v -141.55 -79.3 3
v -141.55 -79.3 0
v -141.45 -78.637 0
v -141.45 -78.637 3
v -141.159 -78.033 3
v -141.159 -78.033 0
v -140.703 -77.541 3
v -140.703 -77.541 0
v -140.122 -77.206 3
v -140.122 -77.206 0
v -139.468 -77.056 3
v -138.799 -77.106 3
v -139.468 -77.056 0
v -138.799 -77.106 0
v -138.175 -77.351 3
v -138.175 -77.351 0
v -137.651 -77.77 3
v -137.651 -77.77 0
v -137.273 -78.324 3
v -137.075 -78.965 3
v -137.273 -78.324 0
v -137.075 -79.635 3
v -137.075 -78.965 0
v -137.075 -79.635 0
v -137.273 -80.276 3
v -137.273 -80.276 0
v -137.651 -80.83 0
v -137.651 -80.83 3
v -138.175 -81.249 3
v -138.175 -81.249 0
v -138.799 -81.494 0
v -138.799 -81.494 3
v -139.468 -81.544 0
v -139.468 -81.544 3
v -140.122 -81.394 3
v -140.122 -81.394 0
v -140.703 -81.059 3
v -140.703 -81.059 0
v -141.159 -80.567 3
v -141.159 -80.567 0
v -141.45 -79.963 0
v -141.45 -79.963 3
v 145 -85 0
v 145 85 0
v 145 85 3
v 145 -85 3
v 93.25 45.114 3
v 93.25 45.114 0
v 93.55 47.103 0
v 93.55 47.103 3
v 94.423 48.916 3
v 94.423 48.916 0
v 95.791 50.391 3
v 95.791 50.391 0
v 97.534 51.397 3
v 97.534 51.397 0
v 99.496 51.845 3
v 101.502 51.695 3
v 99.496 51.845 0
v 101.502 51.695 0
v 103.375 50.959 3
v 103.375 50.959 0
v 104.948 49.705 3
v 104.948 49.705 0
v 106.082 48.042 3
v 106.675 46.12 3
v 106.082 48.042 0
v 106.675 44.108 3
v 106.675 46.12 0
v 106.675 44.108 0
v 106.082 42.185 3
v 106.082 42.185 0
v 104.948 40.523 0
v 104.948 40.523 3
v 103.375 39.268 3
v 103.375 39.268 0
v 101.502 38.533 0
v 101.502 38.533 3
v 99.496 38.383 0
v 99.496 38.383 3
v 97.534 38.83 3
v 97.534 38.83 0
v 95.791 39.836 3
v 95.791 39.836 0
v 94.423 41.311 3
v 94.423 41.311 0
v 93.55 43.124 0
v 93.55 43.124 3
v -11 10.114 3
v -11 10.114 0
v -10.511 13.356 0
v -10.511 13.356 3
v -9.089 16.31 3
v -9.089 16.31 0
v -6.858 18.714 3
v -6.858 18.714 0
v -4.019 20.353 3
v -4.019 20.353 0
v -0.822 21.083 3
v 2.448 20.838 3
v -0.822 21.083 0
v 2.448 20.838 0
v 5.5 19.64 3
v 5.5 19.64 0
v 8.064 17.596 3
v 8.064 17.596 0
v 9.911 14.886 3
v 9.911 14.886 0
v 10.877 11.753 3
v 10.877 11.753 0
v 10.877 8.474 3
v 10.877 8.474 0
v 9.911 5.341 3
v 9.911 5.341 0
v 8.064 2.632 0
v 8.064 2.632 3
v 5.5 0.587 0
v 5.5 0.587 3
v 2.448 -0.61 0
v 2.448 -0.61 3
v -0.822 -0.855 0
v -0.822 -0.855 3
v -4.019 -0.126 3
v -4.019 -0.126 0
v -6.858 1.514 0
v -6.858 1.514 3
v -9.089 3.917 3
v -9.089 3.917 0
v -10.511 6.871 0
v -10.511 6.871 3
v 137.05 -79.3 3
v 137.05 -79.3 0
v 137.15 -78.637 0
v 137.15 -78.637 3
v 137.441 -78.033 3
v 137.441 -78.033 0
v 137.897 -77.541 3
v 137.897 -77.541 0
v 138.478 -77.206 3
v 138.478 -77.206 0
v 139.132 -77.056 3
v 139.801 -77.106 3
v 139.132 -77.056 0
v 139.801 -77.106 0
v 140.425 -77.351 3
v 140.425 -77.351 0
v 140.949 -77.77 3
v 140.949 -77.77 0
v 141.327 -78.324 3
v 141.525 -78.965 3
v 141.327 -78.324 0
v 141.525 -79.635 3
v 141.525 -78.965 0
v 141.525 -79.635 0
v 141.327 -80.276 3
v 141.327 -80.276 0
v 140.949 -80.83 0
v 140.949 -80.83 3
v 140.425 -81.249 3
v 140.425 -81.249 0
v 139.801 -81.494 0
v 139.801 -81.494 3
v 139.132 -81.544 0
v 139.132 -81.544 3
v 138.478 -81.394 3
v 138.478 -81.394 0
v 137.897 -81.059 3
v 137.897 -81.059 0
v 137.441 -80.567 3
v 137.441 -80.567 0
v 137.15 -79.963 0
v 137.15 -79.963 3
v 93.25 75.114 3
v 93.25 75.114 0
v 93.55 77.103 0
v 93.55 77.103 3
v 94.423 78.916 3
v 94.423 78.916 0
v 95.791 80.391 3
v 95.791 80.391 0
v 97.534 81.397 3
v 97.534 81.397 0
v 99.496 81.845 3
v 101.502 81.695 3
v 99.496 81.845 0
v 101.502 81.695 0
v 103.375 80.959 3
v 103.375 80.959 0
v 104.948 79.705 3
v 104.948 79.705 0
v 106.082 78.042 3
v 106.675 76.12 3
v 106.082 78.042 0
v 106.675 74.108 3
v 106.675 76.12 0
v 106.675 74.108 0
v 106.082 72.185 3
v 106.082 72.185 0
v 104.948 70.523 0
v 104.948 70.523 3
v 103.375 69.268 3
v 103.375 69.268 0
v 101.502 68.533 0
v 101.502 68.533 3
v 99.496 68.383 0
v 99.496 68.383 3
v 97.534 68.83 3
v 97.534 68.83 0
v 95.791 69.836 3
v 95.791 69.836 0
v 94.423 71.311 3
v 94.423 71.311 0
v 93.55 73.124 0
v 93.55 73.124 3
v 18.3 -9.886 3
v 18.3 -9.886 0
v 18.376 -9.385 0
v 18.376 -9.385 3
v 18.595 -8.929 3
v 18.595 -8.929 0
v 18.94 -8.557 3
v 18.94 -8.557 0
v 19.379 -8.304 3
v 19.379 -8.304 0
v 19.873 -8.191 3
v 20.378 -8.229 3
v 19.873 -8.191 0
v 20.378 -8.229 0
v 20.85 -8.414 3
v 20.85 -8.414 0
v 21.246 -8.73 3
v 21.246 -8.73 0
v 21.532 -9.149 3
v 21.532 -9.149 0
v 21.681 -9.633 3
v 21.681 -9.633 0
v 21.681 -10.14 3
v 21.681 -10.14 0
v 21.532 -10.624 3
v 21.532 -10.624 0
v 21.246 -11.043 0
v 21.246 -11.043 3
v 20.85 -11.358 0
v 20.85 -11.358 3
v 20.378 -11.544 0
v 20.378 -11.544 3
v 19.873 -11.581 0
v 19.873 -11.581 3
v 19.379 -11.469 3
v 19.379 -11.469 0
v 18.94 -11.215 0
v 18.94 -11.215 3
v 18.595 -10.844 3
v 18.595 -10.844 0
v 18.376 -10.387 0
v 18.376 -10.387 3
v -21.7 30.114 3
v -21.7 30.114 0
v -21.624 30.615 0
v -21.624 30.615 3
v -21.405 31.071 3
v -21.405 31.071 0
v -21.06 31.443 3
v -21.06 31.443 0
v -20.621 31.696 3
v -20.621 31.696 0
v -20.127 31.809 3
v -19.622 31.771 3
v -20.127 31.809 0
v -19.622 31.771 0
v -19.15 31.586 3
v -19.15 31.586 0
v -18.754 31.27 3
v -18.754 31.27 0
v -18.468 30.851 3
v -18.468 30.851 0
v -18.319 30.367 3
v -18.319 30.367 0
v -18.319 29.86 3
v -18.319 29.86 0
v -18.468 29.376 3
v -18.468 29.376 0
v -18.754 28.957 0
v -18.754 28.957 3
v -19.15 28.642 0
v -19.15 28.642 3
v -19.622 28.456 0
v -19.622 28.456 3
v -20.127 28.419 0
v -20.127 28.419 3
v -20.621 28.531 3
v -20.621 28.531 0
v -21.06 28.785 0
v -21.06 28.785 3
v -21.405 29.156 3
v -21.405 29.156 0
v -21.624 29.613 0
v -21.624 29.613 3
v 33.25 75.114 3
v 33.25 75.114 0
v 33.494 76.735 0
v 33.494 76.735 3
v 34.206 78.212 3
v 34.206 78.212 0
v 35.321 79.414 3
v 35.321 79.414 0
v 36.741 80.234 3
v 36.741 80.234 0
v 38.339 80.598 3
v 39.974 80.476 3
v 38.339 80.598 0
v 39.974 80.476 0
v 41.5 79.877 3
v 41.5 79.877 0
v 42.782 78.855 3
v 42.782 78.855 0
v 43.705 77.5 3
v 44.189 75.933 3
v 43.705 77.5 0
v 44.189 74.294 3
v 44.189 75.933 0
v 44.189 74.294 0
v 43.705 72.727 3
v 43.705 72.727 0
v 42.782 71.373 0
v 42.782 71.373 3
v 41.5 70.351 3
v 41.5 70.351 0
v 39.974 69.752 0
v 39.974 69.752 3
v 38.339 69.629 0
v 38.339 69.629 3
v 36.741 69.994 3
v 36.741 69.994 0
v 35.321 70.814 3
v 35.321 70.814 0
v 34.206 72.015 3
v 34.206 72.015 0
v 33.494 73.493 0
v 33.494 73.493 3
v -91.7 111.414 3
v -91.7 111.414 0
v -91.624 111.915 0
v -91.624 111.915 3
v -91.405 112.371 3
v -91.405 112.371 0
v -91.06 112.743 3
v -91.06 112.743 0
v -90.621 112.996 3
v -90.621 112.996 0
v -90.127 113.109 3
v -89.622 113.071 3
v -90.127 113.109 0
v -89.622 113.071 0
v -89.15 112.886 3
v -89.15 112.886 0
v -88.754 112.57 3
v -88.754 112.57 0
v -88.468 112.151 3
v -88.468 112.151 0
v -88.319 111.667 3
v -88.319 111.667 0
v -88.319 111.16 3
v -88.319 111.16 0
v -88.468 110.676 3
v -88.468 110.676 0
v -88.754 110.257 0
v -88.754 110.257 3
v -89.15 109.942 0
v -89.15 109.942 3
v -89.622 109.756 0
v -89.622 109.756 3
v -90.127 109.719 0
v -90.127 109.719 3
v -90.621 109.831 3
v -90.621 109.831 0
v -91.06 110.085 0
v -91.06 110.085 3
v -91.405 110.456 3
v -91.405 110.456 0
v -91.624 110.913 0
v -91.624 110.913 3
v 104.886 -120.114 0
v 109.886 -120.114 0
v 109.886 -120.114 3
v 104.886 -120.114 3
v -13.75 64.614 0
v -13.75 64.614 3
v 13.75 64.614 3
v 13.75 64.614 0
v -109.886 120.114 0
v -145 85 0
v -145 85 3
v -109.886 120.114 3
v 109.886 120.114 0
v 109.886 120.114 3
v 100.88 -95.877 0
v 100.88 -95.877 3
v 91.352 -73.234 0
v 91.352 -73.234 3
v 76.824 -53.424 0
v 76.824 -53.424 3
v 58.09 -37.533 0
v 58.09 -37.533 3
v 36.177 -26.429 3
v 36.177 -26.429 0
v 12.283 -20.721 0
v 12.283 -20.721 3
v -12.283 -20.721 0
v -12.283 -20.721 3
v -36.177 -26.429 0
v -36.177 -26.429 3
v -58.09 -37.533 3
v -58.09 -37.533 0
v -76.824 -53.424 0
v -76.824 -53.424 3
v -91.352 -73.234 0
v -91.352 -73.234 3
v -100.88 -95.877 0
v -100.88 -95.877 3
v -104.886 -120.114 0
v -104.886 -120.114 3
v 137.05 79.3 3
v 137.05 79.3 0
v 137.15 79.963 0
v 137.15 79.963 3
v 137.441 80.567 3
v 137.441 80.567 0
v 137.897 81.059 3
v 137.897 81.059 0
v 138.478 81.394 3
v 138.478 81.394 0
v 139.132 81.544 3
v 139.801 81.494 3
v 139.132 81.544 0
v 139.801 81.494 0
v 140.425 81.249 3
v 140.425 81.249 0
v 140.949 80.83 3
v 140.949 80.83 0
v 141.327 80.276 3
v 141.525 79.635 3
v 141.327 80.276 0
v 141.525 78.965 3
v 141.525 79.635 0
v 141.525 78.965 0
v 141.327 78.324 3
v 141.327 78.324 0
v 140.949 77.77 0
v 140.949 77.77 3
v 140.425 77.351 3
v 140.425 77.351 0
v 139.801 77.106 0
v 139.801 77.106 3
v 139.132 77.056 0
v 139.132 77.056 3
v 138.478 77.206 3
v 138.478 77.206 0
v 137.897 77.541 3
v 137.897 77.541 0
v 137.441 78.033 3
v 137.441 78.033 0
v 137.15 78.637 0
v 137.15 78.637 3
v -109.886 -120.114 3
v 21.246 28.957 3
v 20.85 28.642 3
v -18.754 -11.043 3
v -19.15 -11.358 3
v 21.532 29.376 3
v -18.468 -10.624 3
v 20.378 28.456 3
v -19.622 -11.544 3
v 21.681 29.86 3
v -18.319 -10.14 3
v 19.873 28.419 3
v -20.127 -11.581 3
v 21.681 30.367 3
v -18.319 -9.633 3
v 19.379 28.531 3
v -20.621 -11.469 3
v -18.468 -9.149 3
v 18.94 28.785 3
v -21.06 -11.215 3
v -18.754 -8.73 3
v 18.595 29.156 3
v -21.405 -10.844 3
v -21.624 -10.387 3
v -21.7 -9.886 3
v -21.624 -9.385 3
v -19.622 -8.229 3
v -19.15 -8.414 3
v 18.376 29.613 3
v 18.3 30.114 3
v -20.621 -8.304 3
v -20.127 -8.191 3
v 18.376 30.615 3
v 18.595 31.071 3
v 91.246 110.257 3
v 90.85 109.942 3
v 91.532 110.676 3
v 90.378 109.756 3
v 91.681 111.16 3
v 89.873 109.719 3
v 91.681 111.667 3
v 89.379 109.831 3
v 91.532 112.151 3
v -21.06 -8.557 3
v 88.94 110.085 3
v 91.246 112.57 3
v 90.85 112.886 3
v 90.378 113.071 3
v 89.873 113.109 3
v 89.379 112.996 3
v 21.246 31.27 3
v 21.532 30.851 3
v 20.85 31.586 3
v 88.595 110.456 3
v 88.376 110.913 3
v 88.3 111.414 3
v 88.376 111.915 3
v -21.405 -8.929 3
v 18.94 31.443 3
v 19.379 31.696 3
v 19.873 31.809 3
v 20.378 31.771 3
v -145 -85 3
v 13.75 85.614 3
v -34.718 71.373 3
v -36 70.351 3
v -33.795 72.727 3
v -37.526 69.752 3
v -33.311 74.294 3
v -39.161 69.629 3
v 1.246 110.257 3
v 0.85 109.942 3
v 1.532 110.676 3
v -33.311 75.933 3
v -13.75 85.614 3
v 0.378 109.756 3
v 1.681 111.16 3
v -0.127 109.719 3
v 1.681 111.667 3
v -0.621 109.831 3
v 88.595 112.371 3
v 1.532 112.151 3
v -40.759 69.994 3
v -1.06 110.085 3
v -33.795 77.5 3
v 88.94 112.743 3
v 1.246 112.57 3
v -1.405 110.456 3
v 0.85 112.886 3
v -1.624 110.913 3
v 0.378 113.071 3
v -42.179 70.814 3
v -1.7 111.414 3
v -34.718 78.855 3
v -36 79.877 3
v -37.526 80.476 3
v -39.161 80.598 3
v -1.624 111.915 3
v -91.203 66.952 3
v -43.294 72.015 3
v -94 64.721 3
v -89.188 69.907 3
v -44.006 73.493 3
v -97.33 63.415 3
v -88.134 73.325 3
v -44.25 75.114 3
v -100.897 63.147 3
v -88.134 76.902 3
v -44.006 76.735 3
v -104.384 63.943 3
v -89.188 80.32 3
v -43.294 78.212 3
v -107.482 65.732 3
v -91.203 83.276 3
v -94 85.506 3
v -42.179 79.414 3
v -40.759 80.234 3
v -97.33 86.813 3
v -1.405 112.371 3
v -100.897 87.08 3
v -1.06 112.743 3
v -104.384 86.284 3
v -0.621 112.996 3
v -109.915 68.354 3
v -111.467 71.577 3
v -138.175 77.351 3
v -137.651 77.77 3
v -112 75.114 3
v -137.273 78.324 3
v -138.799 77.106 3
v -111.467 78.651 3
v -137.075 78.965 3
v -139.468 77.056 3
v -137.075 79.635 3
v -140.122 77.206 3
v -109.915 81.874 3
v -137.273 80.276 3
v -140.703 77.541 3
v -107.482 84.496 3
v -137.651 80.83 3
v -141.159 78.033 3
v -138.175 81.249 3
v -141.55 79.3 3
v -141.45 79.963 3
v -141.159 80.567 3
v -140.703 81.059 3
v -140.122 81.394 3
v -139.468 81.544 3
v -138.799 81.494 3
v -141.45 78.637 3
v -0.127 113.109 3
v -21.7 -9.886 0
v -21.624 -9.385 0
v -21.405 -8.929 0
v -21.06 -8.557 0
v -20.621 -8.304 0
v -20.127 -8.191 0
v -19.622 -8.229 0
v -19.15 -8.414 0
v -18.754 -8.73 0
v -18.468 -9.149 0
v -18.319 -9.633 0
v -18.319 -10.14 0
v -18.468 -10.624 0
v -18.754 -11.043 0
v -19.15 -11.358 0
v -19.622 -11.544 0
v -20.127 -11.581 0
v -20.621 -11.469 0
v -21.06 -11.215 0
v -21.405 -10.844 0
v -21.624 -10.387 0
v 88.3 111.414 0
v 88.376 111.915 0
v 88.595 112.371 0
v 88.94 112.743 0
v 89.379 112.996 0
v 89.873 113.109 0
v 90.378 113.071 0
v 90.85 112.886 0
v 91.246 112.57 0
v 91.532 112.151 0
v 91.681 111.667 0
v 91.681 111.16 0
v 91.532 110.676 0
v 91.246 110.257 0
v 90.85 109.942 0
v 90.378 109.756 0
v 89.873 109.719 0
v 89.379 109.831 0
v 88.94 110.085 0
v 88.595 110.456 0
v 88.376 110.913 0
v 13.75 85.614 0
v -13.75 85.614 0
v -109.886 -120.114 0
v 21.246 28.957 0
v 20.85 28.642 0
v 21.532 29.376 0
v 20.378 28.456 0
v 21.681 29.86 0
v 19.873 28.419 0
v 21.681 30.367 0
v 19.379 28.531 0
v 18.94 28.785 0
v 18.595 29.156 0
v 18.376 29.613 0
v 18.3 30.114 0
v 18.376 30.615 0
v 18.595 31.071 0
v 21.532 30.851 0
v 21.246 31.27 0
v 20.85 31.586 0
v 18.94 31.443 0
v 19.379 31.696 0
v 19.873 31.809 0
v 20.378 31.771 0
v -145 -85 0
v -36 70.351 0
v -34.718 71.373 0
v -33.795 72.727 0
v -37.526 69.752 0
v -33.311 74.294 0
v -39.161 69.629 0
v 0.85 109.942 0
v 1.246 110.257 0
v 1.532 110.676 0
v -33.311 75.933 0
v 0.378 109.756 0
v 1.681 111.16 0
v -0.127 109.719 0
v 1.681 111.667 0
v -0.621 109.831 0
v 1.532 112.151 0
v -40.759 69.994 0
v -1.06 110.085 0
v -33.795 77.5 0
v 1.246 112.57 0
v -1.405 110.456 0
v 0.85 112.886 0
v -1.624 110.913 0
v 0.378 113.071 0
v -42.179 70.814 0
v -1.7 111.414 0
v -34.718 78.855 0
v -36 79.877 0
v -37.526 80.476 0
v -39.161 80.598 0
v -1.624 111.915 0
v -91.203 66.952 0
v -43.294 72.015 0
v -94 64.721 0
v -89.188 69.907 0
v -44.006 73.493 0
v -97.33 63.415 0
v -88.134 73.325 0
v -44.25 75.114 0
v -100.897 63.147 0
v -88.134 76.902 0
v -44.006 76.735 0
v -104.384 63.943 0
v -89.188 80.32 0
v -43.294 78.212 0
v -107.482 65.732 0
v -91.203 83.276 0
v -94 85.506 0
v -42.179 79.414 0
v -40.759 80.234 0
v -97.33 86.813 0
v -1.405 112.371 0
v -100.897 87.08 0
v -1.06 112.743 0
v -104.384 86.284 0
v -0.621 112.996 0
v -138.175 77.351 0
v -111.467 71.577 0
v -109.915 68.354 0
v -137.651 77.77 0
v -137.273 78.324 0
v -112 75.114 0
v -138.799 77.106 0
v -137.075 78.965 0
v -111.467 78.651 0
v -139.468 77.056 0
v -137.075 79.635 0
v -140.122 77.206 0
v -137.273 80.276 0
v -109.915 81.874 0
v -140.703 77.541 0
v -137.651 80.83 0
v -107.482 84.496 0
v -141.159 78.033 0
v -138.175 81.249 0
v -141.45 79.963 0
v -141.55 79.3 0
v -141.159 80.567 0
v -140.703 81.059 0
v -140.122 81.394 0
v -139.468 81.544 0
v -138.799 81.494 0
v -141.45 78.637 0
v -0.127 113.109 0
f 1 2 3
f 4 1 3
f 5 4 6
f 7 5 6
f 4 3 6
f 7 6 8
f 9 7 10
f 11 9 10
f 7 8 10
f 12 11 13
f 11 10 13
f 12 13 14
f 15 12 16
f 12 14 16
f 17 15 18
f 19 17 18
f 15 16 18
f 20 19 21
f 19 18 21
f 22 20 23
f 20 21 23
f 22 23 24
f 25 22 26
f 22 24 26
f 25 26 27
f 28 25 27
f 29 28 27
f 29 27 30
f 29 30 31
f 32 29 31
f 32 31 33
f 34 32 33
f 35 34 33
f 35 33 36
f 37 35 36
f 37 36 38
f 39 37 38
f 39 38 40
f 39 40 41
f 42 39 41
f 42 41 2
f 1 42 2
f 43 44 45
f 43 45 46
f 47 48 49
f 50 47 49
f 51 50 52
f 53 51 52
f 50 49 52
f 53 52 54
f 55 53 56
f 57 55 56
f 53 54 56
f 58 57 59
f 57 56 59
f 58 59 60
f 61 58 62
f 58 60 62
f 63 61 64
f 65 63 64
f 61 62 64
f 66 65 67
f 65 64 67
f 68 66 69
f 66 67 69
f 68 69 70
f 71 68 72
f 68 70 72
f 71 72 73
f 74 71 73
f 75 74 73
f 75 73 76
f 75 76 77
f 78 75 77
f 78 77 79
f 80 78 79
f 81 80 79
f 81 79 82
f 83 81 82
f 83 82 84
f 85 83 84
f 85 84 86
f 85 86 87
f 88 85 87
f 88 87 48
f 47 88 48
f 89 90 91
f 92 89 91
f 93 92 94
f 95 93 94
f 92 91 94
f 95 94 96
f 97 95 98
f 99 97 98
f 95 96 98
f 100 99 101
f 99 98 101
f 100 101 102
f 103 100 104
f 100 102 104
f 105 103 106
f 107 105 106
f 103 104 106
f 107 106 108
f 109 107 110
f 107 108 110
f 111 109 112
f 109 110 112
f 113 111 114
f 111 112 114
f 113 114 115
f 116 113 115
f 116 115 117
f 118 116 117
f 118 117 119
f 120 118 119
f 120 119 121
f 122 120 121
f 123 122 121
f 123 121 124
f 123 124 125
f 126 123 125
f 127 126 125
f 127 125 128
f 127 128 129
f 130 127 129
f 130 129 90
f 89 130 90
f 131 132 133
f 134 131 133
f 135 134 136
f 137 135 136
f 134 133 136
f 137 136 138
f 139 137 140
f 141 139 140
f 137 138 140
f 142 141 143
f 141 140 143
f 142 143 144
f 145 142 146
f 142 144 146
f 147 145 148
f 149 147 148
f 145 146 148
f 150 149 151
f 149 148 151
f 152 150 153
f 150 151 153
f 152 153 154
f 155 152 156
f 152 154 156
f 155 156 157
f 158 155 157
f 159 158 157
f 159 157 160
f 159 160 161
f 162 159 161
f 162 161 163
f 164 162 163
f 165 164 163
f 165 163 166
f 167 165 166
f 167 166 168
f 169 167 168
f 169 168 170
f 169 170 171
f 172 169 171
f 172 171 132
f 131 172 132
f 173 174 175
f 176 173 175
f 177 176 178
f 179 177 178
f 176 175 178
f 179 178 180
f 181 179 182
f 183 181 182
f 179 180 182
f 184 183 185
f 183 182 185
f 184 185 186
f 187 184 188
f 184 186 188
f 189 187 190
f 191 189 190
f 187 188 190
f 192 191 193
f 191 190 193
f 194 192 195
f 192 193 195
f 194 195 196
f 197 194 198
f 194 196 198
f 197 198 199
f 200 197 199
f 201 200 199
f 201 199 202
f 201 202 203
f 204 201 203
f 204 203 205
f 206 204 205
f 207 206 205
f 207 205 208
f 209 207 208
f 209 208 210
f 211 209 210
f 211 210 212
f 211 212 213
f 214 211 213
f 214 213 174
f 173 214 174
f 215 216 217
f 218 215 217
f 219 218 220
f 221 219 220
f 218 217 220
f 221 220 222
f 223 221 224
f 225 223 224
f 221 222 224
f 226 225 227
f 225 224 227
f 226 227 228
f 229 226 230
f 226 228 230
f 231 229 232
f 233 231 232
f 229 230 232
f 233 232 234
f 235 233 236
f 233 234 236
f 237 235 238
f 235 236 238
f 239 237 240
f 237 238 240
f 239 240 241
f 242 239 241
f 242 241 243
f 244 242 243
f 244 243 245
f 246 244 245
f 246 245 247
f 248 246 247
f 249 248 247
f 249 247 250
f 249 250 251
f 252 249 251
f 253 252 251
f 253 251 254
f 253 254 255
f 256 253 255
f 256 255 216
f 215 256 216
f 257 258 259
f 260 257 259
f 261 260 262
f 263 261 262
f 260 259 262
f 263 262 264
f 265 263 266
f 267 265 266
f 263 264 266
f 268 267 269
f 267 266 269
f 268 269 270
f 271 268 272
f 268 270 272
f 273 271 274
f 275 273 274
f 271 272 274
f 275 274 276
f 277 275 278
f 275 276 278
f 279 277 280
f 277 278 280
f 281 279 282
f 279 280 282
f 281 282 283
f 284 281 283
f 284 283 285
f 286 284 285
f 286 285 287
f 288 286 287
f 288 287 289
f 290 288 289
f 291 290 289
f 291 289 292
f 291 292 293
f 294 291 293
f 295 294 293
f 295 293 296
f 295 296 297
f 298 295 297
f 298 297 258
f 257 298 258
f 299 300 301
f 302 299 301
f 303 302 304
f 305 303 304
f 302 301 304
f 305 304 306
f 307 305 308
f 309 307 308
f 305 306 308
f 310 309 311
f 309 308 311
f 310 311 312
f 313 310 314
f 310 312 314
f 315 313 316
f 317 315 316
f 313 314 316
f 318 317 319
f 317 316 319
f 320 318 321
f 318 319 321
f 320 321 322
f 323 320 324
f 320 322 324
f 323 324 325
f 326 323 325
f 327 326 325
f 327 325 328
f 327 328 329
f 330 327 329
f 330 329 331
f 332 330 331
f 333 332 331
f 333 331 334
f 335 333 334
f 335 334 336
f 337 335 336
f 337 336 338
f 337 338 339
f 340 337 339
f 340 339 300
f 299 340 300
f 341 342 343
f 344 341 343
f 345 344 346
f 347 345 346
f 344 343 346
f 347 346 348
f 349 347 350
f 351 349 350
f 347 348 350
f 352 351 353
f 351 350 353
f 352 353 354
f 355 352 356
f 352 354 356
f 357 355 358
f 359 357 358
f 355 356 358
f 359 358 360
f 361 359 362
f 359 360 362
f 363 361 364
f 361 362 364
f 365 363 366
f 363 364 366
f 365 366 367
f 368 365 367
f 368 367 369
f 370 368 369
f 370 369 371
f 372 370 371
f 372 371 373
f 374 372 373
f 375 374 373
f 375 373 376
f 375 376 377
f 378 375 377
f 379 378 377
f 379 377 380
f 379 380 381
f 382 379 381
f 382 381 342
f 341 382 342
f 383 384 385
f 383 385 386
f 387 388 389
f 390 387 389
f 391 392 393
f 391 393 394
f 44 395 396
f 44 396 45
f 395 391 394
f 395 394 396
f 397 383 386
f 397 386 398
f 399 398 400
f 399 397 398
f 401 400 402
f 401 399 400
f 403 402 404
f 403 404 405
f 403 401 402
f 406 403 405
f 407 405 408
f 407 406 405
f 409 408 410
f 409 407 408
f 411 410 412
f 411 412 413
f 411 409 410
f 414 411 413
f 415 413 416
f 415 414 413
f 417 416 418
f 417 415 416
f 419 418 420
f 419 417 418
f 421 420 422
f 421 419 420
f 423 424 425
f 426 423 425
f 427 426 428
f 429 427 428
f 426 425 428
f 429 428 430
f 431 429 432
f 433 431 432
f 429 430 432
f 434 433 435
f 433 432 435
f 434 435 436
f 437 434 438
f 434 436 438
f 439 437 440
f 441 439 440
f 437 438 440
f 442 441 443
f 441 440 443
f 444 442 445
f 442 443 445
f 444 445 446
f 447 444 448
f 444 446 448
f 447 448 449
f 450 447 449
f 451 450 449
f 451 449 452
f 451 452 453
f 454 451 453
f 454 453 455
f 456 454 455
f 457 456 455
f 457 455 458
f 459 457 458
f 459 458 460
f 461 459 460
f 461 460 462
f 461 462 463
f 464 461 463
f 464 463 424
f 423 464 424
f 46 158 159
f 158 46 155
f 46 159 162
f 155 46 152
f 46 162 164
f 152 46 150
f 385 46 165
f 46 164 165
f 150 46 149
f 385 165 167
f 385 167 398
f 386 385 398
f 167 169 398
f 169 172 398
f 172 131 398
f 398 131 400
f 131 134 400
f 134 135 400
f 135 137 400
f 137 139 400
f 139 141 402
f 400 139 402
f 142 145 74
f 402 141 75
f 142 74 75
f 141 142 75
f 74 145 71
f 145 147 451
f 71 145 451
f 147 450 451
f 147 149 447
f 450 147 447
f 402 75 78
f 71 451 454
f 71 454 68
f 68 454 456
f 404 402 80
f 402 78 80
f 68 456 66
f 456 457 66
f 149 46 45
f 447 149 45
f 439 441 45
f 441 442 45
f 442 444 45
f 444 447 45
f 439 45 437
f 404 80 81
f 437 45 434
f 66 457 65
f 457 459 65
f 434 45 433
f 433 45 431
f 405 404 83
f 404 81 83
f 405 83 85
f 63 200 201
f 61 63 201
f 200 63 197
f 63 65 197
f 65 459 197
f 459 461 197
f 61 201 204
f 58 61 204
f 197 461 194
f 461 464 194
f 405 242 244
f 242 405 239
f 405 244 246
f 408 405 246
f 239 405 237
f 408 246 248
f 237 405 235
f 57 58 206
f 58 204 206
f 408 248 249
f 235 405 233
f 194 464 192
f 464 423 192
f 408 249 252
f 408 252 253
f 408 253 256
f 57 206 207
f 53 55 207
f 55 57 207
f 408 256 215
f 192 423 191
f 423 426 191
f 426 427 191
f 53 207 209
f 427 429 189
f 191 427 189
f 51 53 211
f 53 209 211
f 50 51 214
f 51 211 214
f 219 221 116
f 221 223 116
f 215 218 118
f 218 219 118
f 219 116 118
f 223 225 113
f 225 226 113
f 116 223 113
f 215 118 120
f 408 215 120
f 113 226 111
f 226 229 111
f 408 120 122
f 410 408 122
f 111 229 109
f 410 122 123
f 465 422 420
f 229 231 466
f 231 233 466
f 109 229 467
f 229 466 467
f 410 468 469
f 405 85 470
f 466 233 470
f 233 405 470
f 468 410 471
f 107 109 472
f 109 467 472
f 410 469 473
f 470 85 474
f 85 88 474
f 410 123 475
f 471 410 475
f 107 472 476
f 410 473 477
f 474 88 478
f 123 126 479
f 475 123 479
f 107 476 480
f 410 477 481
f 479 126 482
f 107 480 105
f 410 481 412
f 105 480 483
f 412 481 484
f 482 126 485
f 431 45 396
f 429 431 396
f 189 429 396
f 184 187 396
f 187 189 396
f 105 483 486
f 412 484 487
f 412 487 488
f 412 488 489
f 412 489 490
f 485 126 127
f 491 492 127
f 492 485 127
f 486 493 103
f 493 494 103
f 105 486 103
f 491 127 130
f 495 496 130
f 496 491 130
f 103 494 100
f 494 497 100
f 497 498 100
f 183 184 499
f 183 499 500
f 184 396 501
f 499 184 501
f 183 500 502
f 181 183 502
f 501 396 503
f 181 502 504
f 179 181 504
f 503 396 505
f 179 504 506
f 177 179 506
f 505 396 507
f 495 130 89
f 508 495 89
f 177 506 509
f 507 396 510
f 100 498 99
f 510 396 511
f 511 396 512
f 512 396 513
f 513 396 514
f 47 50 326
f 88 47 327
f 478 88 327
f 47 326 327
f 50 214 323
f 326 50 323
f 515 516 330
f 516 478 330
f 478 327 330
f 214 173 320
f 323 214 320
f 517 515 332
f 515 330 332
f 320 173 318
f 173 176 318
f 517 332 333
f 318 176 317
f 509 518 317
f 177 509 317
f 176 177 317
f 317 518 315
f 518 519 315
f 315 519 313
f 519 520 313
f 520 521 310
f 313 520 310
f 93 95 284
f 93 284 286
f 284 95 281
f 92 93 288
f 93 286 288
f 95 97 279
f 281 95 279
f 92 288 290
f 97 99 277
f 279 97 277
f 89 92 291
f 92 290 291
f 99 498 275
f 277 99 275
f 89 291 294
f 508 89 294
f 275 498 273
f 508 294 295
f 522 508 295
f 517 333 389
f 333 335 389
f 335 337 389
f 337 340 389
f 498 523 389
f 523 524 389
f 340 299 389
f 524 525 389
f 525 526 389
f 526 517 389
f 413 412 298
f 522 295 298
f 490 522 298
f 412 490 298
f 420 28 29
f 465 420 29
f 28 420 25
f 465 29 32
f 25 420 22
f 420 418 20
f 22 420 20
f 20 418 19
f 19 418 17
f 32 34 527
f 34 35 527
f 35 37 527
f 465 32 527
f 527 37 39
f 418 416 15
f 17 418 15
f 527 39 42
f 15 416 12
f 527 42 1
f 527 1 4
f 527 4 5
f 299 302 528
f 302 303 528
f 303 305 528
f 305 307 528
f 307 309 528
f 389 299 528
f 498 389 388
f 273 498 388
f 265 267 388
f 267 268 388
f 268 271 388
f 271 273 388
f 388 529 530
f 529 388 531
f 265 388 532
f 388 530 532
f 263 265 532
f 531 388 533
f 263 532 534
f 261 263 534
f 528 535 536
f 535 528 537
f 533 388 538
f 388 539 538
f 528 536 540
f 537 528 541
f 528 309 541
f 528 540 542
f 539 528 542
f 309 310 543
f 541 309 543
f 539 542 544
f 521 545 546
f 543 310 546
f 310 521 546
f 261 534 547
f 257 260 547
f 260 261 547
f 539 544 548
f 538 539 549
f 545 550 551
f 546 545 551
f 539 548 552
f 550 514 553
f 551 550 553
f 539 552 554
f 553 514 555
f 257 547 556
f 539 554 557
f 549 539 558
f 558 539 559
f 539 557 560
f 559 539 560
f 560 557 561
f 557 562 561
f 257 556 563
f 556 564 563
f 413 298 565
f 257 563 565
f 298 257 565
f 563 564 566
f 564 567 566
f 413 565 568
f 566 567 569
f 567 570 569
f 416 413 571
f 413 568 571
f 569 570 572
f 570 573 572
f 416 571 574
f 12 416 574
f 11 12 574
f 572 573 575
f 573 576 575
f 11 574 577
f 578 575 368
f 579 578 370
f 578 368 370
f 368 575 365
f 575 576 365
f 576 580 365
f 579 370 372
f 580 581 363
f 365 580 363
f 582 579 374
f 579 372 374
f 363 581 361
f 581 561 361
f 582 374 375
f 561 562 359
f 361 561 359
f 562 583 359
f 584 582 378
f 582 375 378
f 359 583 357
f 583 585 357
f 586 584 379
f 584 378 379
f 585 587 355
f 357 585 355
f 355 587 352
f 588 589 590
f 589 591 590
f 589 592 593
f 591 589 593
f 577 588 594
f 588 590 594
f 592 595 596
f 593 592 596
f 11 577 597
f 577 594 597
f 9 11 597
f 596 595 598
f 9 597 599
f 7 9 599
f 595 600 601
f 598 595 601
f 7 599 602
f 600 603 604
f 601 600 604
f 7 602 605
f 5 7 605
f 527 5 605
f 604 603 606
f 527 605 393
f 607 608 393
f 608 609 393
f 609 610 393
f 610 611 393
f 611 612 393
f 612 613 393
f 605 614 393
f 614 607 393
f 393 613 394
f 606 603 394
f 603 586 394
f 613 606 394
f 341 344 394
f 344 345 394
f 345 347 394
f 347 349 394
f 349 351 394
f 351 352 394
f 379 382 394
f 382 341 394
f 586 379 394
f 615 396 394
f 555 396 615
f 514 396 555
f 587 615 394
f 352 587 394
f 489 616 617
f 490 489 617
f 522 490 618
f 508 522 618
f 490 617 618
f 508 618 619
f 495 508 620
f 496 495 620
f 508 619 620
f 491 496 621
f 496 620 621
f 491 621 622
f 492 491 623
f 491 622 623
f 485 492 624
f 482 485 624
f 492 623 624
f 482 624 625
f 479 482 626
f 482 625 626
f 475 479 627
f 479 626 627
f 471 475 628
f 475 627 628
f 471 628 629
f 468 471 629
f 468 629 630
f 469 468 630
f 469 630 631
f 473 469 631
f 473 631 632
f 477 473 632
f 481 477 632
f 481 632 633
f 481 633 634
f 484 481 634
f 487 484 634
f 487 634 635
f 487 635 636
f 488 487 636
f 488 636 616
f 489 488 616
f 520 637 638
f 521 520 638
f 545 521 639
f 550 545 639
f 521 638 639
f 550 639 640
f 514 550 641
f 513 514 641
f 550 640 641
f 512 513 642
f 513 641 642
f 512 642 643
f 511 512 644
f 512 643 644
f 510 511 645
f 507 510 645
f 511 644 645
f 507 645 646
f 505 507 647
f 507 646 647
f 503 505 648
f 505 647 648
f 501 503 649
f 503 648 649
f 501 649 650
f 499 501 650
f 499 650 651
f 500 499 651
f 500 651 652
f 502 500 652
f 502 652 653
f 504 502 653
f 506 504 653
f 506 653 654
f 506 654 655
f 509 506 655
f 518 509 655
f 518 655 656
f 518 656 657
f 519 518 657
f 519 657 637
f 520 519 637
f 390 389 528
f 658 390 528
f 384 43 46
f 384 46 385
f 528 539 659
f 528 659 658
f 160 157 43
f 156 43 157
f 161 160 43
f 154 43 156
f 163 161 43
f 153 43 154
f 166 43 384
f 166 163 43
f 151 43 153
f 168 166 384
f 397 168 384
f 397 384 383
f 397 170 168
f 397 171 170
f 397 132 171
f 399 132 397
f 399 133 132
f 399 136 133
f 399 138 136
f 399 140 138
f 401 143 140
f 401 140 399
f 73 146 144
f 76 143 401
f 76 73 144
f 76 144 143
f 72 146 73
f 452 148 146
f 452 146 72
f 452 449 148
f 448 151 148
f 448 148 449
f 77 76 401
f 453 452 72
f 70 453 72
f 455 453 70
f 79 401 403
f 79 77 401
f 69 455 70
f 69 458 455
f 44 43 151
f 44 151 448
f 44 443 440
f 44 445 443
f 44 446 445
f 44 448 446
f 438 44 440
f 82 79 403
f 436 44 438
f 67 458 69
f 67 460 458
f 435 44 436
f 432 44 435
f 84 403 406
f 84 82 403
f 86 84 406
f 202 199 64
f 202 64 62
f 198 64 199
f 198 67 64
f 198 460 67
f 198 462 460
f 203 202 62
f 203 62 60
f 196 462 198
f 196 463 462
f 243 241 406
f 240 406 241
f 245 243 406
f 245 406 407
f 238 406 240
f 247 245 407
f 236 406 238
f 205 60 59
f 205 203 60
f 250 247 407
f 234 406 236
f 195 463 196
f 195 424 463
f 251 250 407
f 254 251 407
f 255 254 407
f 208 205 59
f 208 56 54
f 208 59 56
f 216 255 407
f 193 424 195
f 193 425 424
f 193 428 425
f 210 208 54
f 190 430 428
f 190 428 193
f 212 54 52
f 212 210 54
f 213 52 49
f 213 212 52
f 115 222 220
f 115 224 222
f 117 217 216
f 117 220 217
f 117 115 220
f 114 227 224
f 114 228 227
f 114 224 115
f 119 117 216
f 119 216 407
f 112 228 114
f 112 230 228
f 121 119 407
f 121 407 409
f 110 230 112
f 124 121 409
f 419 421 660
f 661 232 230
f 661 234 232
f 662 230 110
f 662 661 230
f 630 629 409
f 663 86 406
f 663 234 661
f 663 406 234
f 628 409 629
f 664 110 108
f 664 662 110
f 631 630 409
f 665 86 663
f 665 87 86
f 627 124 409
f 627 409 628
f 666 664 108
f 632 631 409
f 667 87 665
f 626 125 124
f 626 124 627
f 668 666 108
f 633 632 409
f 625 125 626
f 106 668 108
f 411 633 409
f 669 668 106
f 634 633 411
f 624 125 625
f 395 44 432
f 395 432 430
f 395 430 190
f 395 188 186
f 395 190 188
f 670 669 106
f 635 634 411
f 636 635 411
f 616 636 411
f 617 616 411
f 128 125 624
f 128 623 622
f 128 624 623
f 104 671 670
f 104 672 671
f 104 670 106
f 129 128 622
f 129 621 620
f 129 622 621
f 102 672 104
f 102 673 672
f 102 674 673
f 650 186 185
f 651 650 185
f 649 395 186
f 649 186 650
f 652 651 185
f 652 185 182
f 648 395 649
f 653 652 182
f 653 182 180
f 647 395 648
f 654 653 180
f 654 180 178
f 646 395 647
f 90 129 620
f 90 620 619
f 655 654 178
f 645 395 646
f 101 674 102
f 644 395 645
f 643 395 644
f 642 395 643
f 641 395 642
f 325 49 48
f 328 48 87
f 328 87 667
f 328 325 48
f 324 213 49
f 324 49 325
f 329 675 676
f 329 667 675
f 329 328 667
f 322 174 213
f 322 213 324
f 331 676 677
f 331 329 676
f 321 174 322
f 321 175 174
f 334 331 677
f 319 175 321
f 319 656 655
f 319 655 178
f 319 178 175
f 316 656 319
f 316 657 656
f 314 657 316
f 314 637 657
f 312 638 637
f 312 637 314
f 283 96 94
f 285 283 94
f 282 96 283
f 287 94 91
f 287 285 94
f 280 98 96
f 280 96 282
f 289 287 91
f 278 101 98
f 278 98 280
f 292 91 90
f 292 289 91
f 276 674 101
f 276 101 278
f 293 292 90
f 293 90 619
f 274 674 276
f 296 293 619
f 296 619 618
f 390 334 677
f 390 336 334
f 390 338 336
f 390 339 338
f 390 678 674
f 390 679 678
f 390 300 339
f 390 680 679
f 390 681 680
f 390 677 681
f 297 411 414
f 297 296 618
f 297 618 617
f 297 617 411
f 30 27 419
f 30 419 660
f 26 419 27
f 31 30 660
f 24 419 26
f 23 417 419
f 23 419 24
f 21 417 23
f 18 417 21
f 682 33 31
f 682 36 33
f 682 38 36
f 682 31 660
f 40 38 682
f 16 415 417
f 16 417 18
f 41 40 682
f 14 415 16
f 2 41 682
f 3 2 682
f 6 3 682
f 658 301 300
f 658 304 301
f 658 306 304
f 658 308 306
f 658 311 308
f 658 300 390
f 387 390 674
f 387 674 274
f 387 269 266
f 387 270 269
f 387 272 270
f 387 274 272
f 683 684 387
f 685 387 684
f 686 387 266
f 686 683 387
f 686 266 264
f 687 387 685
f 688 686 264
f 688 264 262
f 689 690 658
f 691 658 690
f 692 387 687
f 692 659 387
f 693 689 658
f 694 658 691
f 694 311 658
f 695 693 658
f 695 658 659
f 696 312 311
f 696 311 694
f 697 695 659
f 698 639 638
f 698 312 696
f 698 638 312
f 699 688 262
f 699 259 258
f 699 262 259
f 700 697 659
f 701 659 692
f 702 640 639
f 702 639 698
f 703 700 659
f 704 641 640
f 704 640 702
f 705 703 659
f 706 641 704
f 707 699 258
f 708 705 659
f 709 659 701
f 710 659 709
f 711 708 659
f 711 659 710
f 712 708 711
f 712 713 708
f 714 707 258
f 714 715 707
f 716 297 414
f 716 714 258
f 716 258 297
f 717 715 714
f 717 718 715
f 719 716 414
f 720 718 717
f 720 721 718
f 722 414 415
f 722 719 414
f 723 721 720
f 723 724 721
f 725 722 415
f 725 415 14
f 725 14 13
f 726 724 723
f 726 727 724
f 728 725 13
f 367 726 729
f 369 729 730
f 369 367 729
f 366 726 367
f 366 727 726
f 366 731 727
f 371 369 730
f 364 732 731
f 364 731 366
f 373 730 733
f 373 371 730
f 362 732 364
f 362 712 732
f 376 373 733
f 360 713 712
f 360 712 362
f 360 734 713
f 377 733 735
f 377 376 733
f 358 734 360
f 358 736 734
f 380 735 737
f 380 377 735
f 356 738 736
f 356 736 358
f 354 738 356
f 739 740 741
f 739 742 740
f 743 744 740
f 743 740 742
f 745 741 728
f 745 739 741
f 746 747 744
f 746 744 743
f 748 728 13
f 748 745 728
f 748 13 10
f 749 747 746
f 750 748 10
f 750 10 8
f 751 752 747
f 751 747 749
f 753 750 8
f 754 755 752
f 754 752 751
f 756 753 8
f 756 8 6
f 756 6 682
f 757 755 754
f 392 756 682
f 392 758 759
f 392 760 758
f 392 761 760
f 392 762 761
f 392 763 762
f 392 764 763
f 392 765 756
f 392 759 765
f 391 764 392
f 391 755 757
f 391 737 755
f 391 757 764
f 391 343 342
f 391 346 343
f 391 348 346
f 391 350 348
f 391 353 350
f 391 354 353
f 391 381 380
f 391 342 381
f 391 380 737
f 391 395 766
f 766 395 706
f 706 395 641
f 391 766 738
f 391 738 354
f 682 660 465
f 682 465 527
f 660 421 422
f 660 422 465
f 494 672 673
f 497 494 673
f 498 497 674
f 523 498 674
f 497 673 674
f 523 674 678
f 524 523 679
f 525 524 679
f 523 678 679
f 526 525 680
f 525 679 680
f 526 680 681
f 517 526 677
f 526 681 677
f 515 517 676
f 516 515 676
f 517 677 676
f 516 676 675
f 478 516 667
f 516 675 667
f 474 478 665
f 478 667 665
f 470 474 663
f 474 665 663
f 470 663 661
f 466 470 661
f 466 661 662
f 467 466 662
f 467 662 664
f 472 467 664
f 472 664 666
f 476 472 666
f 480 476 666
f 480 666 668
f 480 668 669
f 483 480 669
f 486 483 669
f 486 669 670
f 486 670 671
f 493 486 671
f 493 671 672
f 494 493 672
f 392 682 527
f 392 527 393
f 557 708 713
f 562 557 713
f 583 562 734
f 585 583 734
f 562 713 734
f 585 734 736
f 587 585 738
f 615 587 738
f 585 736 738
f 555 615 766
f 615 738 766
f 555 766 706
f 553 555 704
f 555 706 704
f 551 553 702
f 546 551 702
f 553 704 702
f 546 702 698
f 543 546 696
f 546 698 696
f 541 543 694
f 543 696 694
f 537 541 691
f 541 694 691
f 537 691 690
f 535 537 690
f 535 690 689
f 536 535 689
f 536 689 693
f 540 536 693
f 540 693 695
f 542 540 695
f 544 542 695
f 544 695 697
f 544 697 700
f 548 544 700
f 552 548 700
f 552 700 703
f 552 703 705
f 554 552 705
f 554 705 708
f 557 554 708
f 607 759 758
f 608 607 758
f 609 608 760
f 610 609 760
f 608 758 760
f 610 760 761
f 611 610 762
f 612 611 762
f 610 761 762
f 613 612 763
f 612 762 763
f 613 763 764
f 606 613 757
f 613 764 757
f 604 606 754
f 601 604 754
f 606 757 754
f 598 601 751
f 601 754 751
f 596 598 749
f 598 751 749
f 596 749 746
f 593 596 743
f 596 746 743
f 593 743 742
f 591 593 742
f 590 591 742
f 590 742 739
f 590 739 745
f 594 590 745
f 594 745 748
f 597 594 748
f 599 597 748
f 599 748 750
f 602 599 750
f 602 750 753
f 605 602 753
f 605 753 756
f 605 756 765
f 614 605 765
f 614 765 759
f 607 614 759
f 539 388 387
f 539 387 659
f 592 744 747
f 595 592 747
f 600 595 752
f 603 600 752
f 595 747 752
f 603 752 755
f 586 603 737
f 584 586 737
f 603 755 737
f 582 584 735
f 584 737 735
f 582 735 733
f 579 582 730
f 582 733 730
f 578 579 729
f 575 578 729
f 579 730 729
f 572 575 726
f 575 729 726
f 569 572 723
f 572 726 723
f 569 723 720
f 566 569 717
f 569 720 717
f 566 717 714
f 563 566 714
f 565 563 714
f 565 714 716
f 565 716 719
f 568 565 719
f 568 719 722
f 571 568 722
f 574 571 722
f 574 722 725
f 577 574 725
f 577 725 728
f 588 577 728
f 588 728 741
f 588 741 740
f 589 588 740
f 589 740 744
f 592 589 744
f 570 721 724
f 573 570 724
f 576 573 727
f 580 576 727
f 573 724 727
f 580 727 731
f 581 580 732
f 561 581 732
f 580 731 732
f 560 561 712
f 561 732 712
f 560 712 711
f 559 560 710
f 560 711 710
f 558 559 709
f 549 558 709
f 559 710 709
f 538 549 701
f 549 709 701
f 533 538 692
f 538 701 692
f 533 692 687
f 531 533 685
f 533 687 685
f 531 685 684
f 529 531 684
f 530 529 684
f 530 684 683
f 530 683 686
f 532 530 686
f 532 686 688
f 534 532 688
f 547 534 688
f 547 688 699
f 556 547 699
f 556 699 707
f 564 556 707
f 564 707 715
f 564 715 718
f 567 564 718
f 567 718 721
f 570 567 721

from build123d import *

# Parameters (mm, degrees)
BOSS_EXTRU_1_DEPTH      = 3
D_GAGEMENT_M42_D        = 4.5
D_GAGEMENT_M42_DEPTH    = 10
D_GAGEMENT_M42_TIP      = 1.351936393
D_GAGEMENT_M221_D       = 24
D_GAGEMENT_M221_DEPTH   = 10
D_GAGEMENT_M221_TIP     = 7.210327428
D_GAGEMENT_M121_D       = 13.5
D_GAGEMENT_M121_DEPTH   = 10
D_GAGEMENT_M121_TIP     = 4.055809178
D_GAGEMENT_M101_D       = 11
D_GAGEMENT_M101_DEPTH   = 10
D_GAGEMENT_M101_TIP     = 3.304733405
ESQUISSE26_W            = 27.5
ESQUISSE26_H            = 21
ENL_V_MAT_EXTRU_1_DEPTH = 10
D_GAGEMENT_M31_D        = 3.4
D_GAGEMENT_M201_D       = 22
D_GAGEMENT_M33_D        = 3.4


with BuildPart() as part:
    # Esquisse1 → Boss.-Extru.1 (new body)
    with BuildSketch(Plane.XY):
        with BuildLine():
            Line((-145, 85), (-109.886246, 120.113754))
            Line((-109.886246, 120.113754), (109.886246, 120.113754))
            Line((109.886246, 120.113754), (145, 85))
            Line((145, 85), (145, -85))
            Line((145, -85), (109.886246, -120.113754))
            Line((109.886246, -120.113754), (104.886246, -120.113754))
            ThreePointArc((104.886246, -120.113754), (0, -20), (-104.886246, -120.113754))
            Line((-104.886246, -120.113754), (-109.886246, -120.113754))
            Line((-109.886246, -120.113754), (-145, -85))
            Line((-145, -85), (-145, 85))
        make_face()
    extrude(amount=BOSS_EXTRU_1_DEPTH)

    # Dégagement M42
    with Locations(Plane.XY.offset(3)):
        with Locations((-139.3, 79.3), (-139.3, -79.3), (139.3, -79.3), (139.3, 79.3)):
            Hole(D_GAGEMENT_M42_D / 2, depth=D_GAGEMENT_M42_DEPTH)
            with Locations((0, 0, -(D_GAGEMENT_M42_DEPTH + D_GAGEMENT_M42_TIP / 2))):  # 118° drill point
                Cone(0, D_GAGEMENT_M42_D / 2, D_GAGEMENT_M42_TIP, mode=Mode.SUBTRACT)

    # Dégagement M221
    with Locations(Plane.XY.offset(3)):
        with Locations((-100, 75.113754)):
            Hole(D_GAGEMENT_M221_D / 2, depth=D_GAGEMENT_M221_DEPTH)
            with Locations((0, 0, -(D_GAGEMENT_M221_DEPTH + D_GAGEMENT_M221_TIP / 2))):  # 118° drill point
                Cone(0, D_GAGEMENT_M221_D / 2, D_GAGEMENT_M221_TIP, mode=Mode.SUBTRACT)

    # Dégagement M121
    with Locations(Plane.XY.offset(3)):
        with Locations((100, 75.113754), (100, 45.113754)):
            Hole(D_GAGEMENT_M121_D / 2, depth=D_GAGEMENT_M121_DEPTH)
            with Locations((0, 0, -(D_GAGEMENT_M121_DEPTH + D_GAGEMENT_M121_TIP / 2))):  # 118° drill point
                Cone(0, D_GAGEMENT_M121_D / 2, D_GAGEMENT_M121_TIP, mode=Mode.SUBTRACT)

    # Dégagement M101
    with Locations(Plane.XY.offset(3)):
        with Locations((-38.75, 75.113754), (38.75, 75.113754)):
            Hole(D_GAGEMENT_M101_D / 2, depth=D_GAGEMENT_M101_DEPTH)
            with Locations((0, 0, -(D_GAGEMENT_M101_DEPTH + D_GAGEMENT_M101_TIP / 2))):  # 118° drill point
                Cone(0, D_GAGEMENT_M101_D / 2, D_GAGEMENT_M101_TIP, mode=Mode.SUBTRACT)

    # Esquisse26 → Enlèv. mat.-Extru.1 (cut)
    with BuildSketch(Plane.XY.offset(3)):
        with Locations((0, 75.113754)):
            Rectangle(ESQUISSE26_W, ESQUISSE26_H)
    extrude(amount=-ENL_V_MAT_EXTRU_1_DEPTH, mode=Mode.SUBTRACT)

    # Dégagement M31 (through all)
    with Locations(Plane.XY.offset(3)):
        with Locations((0, 111.413754), (-90, 111.413754), (90, 111.413754)):
            Hole(D_GAGEMENT_M31_D / 2)

    # Dégagement M201 (through all)
    with Locations(Plane.XY.offset(3)):
        with Locations((0, 10.113754)):
            Hole(D_GAGEMENT_M201_D / 2)

    # Dégagement M33 (through all)
    with Locations(Plane.XY.offset(3)):
        with Locations((-20, 30.113754), (20, 30.113754), (20, -9.886246), (-20, -9.886246)):
            Hole(D_GAGEMENT_M33_D / 2)


solid = part.part
